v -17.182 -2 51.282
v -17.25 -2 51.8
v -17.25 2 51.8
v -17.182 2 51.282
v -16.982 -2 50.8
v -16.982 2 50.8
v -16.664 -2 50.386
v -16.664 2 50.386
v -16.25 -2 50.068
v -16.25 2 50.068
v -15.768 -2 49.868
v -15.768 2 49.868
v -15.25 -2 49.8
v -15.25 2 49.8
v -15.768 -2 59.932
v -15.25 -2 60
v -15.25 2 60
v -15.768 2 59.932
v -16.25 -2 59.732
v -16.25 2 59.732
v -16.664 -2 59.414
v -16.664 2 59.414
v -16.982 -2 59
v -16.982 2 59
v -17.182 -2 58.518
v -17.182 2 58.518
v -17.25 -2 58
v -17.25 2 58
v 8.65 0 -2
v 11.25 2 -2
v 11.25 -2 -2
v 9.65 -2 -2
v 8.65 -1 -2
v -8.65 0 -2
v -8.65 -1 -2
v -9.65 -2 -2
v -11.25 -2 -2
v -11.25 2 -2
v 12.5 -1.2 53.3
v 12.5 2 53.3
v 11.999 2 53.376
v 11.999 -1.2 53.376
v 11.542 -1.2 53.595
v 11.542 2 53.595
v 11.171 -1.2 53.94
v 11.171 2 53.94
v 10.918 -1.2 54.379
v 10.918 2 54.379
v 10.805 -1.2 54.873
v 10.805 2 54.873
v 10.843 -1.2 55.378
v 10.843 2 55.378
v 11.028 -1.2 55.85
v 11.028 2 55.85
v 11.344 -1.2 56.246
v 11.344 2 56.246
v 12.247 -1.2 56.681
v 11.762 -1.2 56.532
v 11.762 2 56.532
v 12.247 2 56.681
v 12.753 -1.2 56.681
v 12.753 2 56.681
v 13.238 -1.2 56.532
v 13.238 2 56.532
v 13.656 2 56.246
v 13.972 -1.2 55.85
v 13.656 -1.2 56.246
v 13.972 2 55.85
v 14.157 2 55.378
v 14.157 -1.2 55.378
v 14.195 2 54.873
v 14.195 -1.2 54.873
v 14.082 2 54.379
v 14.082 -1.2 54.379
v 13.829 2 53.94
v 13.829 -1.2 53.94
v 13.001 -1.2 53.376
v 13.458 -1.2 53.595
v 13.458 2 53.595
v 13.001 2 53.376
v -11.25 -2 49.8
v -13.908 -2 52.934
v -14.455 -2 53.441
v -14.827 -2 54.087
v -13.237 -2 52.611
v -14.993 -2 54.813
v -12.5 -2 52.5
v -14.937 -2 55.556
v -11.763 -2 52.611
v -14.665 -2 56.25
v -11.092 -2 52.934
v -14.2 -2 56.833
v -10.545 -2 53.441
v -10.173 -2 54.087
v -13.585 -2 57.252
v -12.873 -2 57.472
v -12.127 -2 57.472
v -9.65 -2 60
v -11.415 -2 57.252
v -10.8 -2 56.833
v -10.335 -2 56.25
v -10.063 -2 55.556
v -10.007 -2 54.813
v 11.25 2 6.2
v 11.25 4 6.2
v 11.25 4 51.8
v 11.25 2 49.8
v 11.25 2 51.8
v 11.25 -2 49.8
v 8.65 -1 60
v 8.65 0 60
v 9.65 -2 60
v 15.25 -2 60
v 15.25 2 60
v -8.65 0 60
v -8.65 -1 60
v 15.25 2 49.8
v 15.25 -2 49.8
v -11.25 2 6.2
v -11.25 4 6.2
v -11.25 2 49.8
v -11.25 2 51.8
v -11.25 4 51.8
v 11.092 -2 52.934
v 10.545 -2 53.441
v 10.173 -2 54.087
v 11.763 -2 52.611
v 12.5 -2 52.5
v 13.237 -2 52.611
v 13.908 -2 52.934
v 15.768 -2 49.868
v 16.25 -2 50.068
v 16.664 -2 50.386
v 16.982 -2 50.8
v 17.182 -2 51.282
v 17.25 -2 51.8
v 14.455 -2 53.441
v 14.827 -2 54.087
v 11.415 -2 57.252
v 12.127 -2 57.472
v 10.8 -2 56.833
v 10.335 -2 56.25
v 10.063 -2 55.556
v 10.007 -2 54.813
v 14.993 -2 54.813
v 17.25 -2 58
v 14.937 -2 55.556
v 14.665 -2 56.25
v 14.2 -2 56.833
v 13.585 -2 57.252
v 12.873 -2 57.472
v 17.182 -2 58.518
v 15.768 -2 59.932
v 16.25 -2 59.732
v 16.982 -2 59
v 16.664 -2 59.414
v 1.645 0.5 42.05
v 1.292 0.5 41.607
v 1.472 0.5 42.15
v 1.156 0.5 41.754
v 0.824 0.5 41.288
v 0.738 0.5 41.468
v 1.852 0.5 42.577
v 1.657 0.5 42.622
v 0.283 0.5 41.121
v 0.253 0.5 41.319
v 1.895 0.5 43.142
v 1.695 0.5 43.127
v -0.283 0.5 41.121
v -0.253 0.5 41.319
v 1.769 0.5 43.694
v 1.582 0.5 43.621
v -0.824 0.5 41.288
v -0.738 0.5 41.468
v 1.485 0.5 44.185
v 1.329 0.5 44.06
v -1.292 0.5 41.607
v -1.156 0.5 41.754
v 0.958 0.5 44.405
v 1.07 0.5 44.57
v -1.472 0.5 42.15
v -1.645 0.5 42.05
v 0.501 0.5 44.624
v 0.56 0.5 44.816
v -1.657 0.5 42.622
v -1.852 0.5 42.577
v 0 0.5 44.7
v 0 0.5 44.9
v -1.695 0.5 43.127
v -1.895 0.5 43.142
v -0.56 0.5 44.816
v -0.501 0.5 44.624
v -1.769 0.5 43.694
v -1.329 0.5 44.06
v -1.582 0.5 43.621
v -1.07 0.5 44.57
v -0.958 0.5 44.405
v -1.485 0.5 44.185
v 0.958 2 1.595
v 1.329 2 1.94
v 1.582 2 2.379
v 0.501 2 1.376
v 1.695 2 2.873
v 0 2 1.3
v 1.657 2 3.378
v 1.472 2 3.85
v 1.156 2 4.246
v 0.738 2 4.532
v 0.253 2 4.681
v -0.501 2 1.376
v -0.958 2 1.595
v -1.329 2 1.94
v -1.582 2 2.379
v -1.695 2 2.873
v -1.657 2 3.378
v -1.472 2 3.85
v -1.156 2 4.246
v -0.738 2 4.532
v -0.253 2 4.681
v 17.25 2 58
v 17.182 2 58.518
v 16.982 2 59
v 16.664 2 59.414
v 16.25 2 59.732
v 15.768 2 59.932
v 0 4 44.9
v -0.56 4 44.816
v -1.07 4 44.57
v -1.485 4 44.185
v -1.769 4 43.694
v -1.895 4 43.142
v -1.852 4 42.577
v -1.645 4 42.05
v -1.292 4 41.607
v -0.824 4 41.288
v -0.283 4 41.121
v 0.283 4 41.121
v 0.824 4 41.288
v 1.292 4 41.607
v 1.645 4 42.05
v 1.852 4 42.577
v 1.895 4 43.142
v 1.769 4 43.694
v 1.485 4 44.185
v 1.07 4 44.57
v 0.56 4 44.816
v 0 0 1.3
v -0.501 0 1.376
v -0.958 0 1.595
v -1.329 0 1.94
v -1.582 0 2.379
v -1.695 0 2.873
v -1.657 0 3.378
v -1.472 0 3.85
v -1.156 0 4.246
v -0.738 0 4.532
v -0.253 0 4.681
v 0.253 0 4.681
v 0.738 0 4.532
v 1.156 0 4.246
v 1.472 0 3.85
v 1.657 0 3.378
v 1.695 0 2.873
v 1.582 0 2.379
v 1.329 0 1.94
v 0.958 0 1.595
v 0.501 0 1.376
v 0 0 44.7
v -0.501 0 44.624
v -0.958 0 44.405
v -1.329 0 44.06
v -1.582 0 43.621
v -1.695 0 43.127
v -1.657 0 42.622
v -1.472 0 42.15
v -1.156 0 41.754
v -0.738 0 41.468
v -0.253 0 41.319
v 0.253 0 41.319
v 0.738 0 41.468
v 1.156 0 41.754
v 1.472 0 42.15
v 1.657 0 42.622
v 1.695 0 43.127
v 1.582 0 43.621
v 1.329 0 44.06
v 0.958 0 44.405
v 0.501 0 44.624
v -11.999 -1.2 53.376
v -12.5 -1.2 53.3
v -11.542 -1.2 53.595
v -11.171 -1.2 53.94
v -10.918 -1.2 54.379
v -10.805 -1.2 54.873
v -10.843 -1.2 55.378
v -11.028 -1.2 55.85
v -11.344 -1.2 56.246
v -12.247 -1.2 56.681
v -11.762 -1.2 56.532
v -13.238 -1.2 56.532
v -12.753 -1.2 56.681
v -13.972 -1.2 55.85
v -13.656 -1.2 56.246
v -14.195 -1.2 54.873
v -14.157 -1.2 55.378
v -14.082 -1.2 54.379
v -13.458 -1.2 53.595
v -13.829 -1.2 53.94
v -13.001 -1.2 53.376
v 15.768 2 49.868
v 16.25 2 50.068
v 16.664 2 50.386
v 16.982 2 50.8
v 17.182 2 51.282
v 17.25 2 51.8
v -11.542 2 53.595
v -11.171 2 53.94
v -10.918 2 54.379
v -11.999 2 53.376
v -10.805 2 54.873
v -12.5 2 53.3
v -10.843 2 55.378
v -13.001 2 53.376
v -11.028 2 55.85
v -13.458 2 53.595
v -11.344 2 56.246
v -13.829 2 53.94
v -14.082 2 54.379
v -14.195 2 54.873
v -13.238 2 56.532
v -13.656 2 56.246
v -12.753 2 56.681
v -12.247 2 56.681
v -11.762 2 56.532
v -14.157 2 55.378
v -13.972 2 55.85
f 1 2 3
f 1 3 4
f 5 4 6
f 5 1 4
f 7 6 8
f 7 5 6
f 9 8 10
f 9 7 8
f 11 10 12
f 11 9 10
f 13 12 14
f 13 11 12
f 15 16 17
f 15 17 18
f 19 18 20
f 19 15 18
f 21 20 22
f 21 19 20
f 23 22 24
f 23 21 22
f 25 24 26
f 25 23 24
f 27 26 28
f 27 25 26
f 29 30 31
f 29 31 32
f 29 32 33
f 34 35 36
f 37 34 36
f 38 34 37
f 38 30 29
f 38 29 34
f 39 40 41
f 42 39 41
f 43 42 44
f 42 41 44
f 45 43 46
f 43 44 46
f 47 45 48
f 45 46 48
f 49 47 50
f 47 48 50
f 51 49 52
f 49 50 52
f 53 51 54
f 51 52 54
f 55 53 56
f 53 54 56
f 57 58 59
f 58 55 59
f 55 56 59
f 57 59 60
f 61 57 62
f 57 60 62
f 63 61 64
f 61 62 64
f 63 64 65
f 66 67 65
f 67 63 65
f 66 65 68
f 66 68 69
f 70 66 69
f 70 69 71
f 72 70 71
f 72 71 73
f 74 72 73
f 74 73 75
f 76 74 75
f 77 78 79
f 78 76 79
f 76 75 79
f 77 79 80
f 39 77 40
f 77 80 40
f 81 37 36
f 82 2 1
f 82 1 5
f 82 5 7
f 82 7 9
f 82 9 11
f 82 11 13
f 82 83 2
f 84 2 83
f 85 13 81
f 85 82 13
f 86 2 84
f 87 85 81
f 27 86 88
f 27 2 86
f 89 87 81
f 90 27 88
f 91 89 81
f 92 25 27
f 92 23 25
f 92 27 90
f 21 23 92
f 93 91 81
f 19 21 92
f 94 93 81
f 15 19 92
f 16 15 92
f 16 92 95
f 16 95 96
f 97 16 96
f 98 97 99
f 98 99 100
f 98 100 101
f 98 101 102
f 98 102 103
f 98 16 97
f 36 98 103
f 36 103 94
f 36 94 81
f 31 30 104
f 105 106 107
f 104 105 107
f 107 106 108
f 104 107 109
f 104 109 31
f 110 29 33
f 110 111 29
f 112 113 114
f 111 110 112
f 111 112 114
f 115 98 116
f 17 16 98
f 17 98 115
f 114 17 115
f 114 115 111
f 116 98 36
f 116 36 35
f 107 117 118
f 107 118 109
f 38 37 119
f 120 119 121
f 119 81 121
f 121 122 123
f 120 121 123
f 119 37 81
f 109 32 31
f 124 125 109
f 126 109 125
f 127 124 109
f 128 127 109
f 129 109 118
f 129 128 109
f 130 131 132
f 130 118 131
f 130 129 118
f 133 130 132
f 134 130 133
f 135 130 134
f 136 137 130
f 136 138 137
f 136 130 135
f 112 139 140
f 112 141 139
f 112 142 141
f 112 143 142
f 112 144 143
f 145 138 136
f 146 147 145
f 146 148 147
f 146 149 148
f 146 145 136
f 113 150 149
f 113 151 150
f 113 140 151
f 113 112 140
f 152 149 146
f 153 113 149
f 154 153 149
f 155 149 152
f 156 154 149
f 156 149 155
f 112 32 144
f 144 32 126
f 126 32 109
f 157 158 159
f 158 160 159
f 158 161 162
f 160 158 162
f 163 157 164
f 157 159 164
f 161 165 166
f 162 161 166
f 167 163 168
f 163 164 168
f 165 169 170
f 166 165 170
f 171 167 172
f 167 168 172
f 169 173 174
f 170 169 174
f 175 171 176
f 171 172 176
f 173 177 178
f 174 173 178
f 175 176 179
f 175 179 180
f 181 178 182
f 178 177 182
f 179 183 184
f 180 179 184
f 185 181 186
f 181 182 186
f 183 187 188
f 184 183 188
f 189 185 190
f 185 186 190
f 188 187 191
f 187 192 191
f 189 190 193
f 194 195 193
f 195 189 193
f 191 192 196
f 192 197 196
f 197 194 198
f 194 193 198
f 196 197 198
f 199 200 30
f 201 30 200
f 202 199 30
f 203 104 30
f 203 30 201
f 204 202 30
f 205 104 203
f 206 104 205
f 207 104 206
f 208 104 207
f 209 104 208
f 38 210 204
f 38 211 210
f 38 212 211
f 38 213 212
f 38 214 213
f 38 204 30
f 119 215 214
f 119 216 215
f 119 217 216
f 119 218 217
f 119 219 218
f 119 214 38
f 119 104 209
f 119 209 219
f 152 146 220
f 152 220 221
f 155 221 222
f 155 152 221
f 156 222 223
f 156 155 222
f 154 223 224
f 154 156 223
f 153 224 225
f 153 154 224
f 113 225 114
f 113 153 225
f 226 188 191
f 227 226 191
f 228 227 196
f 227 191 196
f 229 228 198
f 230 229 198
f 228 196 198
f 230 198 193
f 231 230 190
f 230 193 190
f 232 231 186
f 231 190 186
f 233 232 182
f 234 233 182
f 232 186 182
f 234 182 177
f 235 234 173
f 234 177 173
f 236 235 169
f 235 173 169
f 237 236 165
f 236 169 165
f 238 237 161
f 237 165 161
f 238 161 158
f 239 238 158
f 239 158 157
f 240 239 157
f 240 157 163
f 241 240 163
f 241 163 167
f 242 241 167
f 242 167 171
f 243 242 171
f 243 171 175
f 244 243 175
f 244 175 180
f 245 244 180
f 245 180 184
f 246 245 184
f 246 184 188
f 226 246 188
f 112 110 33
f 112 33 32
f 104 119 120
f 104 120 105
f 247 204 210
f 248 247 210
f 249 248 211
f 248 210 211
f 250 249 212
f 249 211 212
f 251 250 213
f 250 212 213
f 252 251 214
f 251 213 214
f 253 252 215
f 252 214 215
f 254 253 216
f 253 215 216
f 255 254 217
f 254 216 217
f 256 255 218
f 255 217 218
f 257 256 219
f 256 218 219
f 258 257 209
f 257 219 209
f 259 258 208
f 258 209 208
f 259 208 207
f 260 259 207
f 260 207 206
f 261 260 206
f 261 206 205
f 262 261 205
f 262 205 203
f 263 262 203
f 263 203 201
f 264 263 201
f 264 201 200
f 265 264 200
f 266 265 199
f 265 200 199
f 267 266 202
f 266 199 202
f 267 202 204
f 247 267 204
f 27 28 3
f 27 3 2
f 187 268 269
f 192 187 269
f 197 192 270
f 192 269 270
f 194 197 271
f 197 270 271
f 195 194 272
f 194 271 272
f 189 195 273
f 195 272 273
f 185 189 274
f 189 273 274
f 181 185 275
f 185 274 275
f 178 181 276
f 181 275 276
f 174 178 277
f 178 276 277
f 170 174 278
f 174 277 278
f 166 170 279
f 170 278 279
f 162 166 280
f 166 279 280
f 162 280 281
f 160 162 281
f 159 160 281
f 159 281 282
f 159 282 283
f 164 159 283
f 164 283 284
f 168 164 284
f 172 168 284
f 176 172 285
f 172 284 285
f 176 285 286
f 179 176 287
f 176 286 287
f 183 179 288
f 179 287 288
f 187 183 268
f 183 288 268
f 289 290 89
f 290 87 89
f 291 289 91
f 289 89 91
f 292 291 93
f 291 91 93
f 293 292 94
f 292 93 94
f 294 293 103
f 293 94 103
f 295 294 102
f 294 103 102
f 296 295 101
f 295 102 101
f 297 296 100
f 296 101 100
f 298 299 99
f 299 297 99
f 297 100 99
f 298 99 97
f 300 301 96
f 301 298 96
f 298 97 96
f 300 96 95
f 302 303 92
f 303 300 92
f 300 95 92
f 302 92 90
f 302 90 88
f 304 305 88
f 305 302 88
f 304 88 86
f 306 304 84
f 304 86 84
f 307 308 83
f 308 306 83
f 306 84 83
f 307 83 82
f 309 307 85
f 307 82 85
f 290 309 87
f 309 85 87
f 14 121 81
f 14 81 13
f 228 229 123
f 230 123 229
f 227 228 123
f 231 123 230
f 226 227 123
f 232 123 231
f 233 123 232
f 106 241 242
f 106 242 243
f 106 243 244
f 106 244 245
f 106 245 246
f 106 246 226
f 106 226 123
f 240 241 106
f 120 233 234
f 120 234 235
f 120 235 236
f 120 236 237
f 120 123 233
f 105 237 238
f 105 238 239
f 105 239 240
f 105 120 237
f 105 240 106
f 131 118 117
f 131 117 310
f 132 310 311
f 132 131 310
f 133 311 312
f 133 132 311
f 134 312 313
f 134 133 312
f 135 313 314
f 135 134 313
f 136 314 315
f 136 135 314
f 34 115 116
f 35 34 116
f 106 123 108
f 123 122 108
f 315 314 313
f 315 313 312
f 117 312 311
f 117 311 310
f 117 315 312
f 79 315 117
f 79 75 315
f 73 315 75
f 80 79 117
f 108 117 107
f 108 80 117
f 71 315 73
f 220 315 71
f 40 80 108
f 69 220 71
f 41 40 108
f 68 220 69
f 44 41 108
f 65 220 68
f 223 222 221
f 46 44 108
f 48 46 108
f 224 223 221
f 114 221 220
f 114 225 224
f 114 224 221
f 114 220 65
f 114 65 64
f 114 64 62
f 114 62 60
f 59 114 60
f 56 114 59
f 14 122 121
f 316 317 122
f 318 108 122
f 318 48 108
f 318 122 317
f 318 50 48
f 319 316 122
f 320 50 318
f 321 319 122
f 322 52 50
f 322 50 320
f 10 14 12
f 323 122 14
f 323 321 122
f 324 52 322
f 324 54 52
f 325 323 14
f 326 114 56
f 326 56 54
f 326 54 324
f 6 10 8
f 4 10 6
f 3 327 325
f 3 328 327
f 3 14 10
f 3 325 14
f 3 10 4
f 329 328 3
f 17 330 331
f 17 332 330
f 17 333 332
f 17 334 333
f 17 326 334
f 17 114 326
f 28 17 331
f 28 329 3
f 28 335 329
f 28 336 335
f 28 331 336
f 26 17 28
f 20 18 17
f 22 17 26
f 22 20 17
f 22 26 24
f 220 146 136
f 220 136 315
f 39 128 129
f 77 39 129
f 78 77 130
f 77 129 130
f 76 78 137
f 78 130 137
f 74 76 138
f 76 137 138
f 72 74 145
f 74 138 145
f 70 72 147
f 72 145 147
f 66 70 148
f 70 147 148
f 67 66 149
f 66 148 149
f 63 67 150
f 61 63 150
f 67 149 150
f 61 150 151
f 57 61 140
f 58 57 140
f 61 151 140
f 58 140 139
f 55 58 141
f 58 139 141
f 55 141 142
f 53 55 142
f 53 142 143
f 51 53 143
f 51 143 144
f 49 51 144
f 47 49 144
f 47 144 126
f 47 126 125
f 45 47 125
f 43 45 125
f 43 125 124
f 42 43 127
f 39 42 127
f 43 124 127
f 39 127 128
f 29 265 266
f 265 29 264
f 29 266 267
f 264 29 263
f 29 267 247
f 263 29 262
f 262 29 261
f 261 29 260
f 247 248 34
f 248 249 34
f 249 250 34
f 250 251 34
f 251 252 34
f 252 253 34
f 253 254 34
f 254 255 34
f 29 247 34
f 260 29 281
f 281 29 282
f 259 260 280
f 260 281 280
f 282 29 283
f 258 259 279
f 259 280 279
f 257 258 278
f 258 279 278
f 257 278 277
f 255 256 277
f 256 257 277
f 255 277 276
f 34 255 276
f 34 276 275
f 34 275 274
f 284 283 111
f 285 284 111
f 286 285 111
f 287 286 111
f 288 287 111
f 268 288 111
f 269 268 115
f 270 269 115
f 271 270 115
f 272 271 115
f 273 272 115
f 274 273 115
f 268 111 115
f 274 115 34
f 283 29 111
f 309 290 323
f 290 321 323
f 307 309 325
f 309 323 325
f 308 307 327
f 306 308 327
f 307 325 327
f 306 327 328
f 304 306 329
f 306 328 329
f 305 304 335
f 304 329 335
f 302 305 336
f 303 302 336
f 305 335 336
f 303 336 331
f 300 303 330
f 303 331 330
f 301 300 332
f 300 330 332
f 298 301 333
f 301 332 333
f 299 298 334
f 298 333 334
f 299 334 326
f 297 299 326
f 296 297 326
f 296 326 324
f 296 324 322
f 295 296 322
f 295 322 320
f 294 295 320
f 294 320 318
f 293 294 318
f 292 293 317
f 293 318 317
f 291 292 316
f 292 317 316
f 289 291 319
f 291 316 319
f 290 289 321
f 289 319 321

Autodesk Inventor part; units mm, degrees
ref_plane "YZ Plane" through (0, 0, 0) normal (1, 0, 0) x (0, 1, 0)
ref_plane "XZ Plane" through (0, 0, 0) normal (0, 1, 0) x (-1, 0, 0)
ref_plane "XY Plane" through (0, 0, 0) normal (0, 0, 1) x (1, 0, 0)
sketch "Skizze1" plane through (0, 0, 0) normal (0, 1, 0) x (-1, 0, 0)
  line L0 (17.75, 60) -> (-17.75, 60)
  line L1 (-17.75, 60) -> (-17.75, 0)
  line L2 (-17.75, 0) -> (17.75, 0)
  line L3 (17.75, 0) -> (17.75, 60)
  point P0 (0, 0)
  point P1 (0, 0)
  dimension "d0" = 60
  dimension "d1" = 35.5
extrude "Extrusion1" add sketch "Skizze1" along normal blind 2
sketch "Skizze3" plane through (0, 2, 0) normal (0, 1, 0) x (1, 0, 0)
  line L0 (-17.75, 0) -> (-17.75, -60) projected
  line L1 (17.75, -60) -> (17.75, 0) projected
  line L2 (-17.75, -51.8) -> (17.75, -51.8)
  line L3 (17.75, -51.8) -> (17.75, -6.2)
  line L4 (-17.75, -6.2) -> (-17.75, -51.8)
  line L5 (17.75, 0) -> (-17.75, 0) projected
  line L6 (-17.75, -6.2) -> (17.75, -6.2)
  point P0 (0, 0)
  point P1 (17.75, -51.8)
  point P2 (0, 0)
  dimension "d71" = 51.8
  dimension "d75" = 6.2
extrude "Extrusion3" add sketch "Skizze3" along normal blind 2 contours L6 L1 L2 L0
sketch "Skizze6" plane through (0, 0, 0) normal (0, -1, 0) x (1, 0, 0)
  line L0 (-17.75, 60) -> (17.75, 60) projected
  line L1 (11.25, 60) -> (-11.25, 60)
  line L2 (-11.25, 60) -> (-11.25, 0)
  line L3 (-11.25, 0) -> (11.25, 0)
  line L4 (11.25, 0) -> (11.25, 60)
  line L5 (8.65, 60) -> (-8.65, 60)
  line L6 (-8.65, 60) -> (-8.65, 0)
  line L7 (-8.65, 0) -> (8.65, 0)
  line L8 (8.65, 0) -> (8.65, 60)
  line L9 (0, -15.6) -> (0, 72.6) projected
  line L10 (17.75, 0) -> (-17.75, 0) projected
  point P0 (0, 0)
  point P1 (0, 60)
  point P2 (0, -1)
  point P3 (0, 60)
  point P4 (0, 0)
  point P5 (8.65, 0)
  point P6 (-8.65, 0)
  dimension "d24" = 17.3
  dimension "d25" = 22.5
extrude "Extrusion6" add sketch "Skizze6" along normal blind 2 contours L0 L6 L3 L2 | L0 L4 L3 L8
sketch "Skizze7" plane through (0, -2, 0) normal (0, -1, 0) x (1, 0, 0)
  line L0 (17.75, 0) -> (11.25, 0)
  line L1 (11.25, 0) -> (11.25, 60)
  line L2 (11.25, 60) -> (17.75, 60)
  line L3 (17.75, 60) -> (17.75, 0)
  point P0 (0, 0)
  dimension "d31" = 6.5
extrude "Extrusion7" cut sketch "Skizze7" against normal through all
mirror "Spiegeln2" about plane through (0, 0, 0) normal (1, 0, 0) of "Extrusion7"
sketch "Skizze9" plane through (0, 0, 0) normal (0, -1, 0) x (1, 0, 0)
  line L0 (0, -12) -> (0, 72) projected
  line L1 (-11.25, 51.8) -> (-11.25, 60) projected
  line L2 (11.25, 6.2) -> (11.25, 0) projected
  line L3 (-11.25, 60) -> (11.25, 60) projected
  line L4 (11.25, 51.8) -> (-11.25, 51.8) projected
  line L5 (11.25, 60) -> (11.25, 51.8) projected
  line L6 (-11.25, 0) -> (-11.25, 6.2) projected
  line L7 (-11.25, 6.2) -> (11.25, 6.2) projected
  line L8 (11.25, 0) -> (-11.25, 0) projected
  point P0 (0, 0)
  point P1 (0, 3)
  point P2 (0, 0)
  dimension "d79" = 3
hole "Bohrung1" at (0, 0, 3) direction (0, 1, 0) diameter 3.4 depth 4 clearance for "Flachkopfmaschinenschraube" size "M3" standard "ANSI Metrisches M Profil"
sketch "Skizze10" plane through (0, 4, 0) normal (0, 1, 0) x (1, 0, 0)
  line L0 (0, 12) -> (0, -72) projected
  circle A0 centre (0, -3) radius 1.7 projected
  point P0 (0, 0)
  point P1 (0, -43)
  dimension "d46" = 40
hole "Bohrung2" at (0, 4, 43) direction (0, -1, 0) diameter 3.4 depth 4 counterbore diameter 3.8 counterbore depth 3.5
sketch "Skizze11" plane through (-11.25, 4, 9.2) normal (-1, 0, 0) x (0, 0, 1)
  line L0 (50.8, -6) -> (42.6, -6)
  line L1 (42.6, -6) -> (42.6, -2)
  line L2 (42.6, -2) -> (50.8, -2)
  line L3 (50.8, -2) -> (50.8, -6)
  point P0 (-9.2, -4)
  point P1 (42.6, -2)
extrude "Extrusion9" add sketch "Skizze11" along normal blind 6
sketch "Skizze12" plane through (0, -2, 0) normal (0, -1, 0) x (1, 0, 0)
  line L0 (-8.65, 60) -> (-17.25, 60) projected
  line L1 (-11.25, 51.8) -> (-11.25, 0) projected
  line L2 (-11.25, 51.8) -> (-17.25, 51.8) projected
  point P0 (0, 0)
  point P1 (-12.5, 55)
  point P2 (-11.25, 9.2)
  dimension "d80" = 1.25
  dimension "d81" = 3.2
hole "Bohrung3" at (-12.5, -2, 55) direction (0, 1, 0) diameter 3.4 depth 4 countersink diameter 5 countersink angle 90 clearance for "Flachkopfmaschinenschraube" size "M3" standard "ANSI Metrisches M Profil"
sketch "Skizze13" plane through (-11.25, -2, 51.8) normal (0, 0, -1) x (-1, 0, 0)
  line L0 (0, 0) -> (0, 4) projected
  line L1 (0, 0) -> (6, 0) projected
  line L2 (6, 4) -> (6, 0) projected
  line L3 (0, 4) -> (6, 4) projected
  point P0 (-11.25, 2)
extrude "Extrusion10" add sketch "Skizze13" along normal blind 2
fillet "Rundung1" radius 2 2 edges at (-17.25, 0, 60) (-17.25, 0, 49.8)
mirror "Spiegeln6" about plane through (0, 0, 0) normal (1, 0, 0) of "Extrusion9", "Bohrung3", "Extrusion10", "Rundung1"
chamfer "Fasen3" distance 1 angle 45 2 edges at (-8.65, -2, 30) (8.65, -2, 30)
sketch "Skizze14" plane through (8.65, 0, 0) normal (0, 0, -1) x (-1, 0, 0)
  line L0 (0, -1) -> (-1, -2) projected
  line L1 (0, 0) -> (0, -1) projected
  line L2 (0, 0) -> (17.3, 0) projected
  line L3 (17.3, 0) -> (17.3, -1) projected
  line L4 (18.3, -2) -> (17.3, -1) projected
  line L5 (19.9, -2) -> (18.3, -2) projected
  line L6 (19.9, -2) -> (19.9, 2) projected
  line L7 (-2.6, 2) -> (19.9, 2) projected
  line L8 (-2.6, 2) -> (-2.6, -2) projected
  line L9 (-1, -2) -> (-2.6, -2) projected
  point P0 (8.65, 0)
extrude "Extrusion11" add sketch "Skizze14" along normal blind 2
properties part number "Zwischenplatte"
